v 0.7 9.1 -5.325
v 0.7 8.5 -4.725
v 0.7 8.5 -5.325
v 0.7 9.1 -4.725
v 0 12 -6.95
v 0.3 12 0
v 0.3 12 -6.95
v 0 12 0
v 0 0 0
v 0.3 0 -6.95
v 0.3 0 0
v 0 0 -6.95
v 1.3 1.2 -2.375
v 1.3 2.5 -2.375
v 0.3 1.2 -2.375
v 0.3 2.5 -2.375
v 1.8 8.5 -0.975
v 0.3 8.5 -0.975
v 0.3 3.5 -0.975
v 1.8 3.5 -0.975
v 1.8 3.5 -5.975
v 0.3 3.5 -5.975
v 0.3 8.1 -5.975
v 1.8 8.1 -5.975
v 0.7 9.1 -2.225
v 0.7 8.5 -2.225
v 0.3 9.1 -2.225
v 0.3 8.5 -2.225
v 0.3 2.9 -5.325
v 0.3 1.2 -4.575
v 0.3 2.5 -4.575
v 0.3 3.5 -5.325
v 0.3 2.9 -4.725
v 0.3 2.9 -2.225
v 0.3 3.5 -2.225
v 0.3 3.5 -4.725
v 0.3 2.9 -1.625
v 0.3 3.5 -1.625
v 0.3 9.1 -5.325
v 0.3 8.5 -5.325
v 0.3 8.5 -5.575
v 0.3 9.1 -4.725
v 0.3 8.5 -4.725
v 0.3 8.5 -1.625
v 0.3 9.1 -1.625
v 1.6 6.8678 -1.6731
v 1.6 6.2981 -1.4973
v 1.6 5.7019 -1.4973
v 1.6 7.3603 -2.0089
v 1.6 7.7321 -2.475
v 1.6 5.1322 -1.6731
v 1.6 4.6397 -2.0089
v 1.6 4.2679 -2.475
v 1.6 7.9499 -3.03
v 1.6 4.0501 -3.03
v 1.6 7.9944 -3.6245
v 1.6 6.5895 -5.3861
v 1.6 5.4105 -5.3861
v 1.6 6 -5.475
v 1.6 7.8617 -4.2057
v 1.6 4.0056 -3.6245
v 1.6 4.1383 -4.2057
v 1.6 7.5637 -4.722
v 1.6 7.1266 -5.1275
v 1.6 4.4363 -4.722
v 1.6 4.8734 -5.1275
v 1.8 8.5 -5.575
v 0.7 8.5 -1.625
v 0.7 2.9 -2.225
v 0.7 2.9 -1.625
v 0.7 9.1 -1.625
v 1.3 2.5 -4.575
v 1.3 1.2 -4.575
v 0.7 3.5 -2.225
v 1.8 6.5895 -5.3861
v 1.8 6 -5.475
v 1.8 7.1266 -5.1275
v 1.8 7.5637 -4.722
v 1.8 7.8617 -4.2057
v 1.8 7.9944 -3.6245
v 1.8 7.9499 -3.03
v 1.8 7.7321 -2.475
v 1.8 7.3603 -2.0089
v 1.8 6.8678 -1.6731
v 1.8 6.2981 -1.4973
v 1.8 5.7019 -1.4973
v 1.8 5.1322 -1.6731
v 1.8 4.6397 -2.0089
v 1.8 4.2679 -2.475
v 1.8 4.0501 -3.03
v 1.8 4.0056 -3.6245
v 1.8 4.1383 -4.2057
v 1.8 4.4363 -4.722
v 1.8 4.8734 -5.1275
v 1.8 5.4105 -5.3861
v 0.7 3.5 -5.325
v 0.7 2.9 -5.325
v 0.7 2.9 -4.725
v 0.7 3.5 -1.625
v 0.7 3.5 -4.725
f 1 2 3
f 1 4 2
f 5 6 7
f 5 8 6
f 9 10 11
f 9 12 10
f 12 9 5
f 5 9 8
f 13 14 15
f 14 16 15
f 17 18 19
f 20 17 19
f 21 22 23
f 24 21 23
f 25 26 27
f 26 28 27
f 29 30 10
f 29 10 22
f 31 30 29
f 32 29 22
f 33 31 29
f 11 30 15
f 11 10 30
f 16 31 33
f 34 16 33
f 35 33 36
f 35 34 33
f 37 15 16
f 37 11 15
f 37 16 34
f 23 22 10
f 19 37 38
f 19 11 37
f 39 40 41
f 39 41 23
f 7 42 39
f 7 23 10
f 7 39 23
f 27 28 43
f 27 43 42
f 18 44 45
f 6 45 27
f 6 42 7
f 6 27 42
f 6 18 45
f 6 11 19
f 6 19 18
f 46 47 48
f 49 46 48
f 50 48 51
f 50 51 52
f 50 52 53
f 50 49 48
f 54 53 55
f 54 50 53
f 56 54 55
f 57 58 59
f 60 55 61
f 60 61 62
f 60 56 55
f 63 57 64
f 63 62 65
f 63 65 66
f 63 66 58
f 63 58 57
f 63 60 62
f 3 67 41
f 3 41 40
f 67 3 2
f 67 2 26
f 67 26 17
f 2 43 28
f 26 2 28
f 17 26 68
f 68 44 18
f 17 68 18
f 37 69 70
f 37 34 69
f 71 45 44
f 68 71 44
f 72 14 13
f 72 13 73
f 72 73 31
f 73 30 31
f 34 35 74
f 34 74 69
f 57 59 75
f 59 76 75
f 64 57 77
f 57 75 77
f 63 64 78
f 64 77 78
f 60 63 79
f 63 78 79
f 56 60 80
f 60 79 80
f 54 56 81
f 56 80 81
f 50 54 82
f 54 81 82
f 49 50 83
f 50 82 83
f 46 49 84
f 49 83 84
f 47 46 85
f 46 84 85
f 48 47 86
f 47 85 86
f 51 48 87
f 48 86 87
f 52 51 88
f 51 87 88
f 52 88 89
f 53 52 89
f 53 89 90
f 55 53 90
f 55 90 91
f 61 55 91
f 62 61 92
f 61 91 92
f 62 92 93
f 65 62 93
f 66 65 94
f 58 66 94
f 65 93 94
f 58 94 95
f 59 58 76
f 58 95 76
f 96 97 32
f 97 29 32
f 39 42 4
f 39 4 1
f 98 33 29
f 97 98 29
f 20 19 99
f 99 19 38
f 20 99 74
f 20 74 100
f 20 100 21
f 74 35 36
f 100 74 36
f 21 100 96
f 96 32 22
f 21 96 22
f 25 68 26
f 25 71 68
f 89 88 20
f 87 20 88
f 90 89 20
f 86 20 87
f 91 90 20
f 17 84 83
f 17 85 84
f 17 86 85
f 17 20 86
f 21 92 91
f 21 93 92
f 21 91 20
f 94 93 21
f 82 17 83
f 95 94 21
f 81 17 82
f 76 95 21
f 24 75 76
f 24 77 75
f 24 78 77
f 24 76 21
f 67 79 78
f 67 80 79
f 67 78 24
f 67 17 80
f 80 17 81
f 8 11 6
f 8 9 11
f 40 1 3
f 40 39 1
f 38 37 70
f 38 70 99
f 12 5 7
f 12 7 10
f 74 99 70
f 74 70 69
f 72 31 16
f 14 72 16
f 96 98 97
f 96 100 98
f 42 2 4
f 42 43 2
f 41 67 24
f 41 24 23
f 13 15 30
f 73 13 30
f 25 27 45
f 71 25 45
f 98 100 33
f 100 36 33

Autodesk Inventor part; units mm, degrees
ref_plane "YZ Plane" through (0, 0, 0) normal (1, 0, 0) x (0, 1, 0)
ref_plane "XZ Plane" through (0, 0, 0) normal (0, 1, 0) x (-1, 0, 0)
ref_plane "XY Plane" through (0, 0, 0) normal (0, 0, 1) x (1, 0, 0)
sketch "Sketch1" plane through (0, 0, 0) normal (1, 0, 0) x (0, 1, 0)
  line L0 (0, 0) -> (12, 0)
  line L1 (12, 0) -> (12, -6.95)
  line L2 (12, -6.95) -> (0, -6.95)
  line L3 (0, -6.95) -> (0, 0)
  dimension "d0" = 12
  dimension "d1" = 6.95
extrude "Extrusion1" add sketch "Sketch1" along normal blind 0.3
sketch "Sketch2" plane through (0.3, 0, 0) normal (1, 0, 0) x (0, 0, -1)
  line L0 (0.975, 3.5) -> (5.975, 3.5)
  line L1 (5.975, 3.5) -> (5.975, 8.5)
  line L2 (5.975, 8.5) -> (0.975, 8.5)
  line L3 (0.975, 8.5) -> (0.975, 3.5)
  line L4 (6.95, 12) -> (0, 12) projected
  line L5 (6.95, 0) -> (6.95, 12) projected
  point P0 (0, 0)
  point P1 (3.475, 8.5)
  point P2 (3.475, 12)
  point P3 (5.975, 6)
  point P4 (6.95, 6)
  dimension "d4" = 5
  dimension "d5" = 5
extrude "Extrusion2" add sketch "Sketch2" along normal blind 1.5
sketch "Sketch3" plane through (1.8, 0, 0) normal (1, 0, 0) x (0, 0, -1)
  circle A0 centre (3.475, 6) radius 2
  line L0 (0.975, 3.5) -> (5.975, 3.5) projected
  line L1 (5.975, 3.5) -> (5.975, 8.5) projected
  point P0 (0, 0)
  point P1 (3.475, 3.5)
  point P2 (5.975, 6)
  dimension "d8" = 4
extrude "Extrusion3" cut sketch "Sketch3" against normal blind 0.2
chamfer "Chamfer1" distance 0.4 angle 45 1 edges at (1.05, 8.5, -5.975)
sketch "Sketch5" plane through (0.3, 0, 0) normal (1, 0, 0) x (0, 0, -1)
  line L0 (5.975, 3.5) -> (0.975, 3.5) projected
  line L1 (1.625, 3.5) -> (2.225, 3.5)
  line L2 (2.225, 3.5) -> (2.225, 2.9)
  line L3 (2.225, 2.9) -> (1.625, 2.9)
  line L4 (1.625, 2.9) -> (1.625, 3.5)
  line L5 (0.975, 3.5) -> (0.975, 8.5) projected
  line L6 (0.975, 6) -> (5.975, 6)
  line L7 (5.975, 8.1) -> (5.975, 3.5) projected
  line L8 (3.475, 3.5) -> (3.475, 8.5)
  line L9 (0.975, 8.5) -> (5.575, 8.5) projected
  line L10 (5.325, 3.5) -> (4.725, 3.5)
  line L11 (4.725, 3.5) -> (4.725, 2.9)
  line L12 (4.725, 2.9) -> (5.325, 2.9)
  line L13 (5.325, 2.9) -> (5.325, 3.5)
  line L14 (1.625, 8.5) -> (2.225, 8.5)
  line L15 (2.225, 8.5) -> (2.225, 9.1)
  line L16 (2.225, 9.1) -> (1.625, 9.1)
  line L17 (1.625, 9.1) -> (1.625, 8.5)
  line L18 (5.325, 8.5) -> (4.725, 8.5)
  line L19 (4.725, 8.5) -> (4.725, 9.1)
  line L20 (4.725, 9.1) -> (5.325, 9.1)
  line L21 (5.325, 9.1) -> (5.325, 8.5)
  point P0 (0, 0)
  dimension "d14" = 0.6
  dimension "d15" = 0.6
  dimension "d16" = 2.5
extrude "Extrusion4" add sketch "Sketch5" along normal blind 0.4 contours L19 L20 L21 L9 | L13 L12 L11 L0 | L2 L3 L4 L0 | L9 L17 L16 L15
sketch "Sketch6" plane through (0.3, 0, 0) normal (1, 0, 0) x (0, 0, -1)
  line L0 (2.375, 1.2) -> (4.575, 1.2)
  line L1 (4.575, 1.2) -> (4.575, 2.5)
  line L2 (4.575, 2.5) -> (2.375, 2.5)
  line L3 (2.375, 2.5) -> (2.375, 1.2)
  line L4 (0, 0) -> (6.95, 0) projected
  point P0 (3.475, 1.2)
  point P1 (3.475, 0)
  dimension "d20" = 2.2
  dimension "d21" = 1.2
  dimension "d24" = 2.5
extrude "Extrusion5" add sketch "Sketch6" along normal blind 1
properties part number "Base144"
